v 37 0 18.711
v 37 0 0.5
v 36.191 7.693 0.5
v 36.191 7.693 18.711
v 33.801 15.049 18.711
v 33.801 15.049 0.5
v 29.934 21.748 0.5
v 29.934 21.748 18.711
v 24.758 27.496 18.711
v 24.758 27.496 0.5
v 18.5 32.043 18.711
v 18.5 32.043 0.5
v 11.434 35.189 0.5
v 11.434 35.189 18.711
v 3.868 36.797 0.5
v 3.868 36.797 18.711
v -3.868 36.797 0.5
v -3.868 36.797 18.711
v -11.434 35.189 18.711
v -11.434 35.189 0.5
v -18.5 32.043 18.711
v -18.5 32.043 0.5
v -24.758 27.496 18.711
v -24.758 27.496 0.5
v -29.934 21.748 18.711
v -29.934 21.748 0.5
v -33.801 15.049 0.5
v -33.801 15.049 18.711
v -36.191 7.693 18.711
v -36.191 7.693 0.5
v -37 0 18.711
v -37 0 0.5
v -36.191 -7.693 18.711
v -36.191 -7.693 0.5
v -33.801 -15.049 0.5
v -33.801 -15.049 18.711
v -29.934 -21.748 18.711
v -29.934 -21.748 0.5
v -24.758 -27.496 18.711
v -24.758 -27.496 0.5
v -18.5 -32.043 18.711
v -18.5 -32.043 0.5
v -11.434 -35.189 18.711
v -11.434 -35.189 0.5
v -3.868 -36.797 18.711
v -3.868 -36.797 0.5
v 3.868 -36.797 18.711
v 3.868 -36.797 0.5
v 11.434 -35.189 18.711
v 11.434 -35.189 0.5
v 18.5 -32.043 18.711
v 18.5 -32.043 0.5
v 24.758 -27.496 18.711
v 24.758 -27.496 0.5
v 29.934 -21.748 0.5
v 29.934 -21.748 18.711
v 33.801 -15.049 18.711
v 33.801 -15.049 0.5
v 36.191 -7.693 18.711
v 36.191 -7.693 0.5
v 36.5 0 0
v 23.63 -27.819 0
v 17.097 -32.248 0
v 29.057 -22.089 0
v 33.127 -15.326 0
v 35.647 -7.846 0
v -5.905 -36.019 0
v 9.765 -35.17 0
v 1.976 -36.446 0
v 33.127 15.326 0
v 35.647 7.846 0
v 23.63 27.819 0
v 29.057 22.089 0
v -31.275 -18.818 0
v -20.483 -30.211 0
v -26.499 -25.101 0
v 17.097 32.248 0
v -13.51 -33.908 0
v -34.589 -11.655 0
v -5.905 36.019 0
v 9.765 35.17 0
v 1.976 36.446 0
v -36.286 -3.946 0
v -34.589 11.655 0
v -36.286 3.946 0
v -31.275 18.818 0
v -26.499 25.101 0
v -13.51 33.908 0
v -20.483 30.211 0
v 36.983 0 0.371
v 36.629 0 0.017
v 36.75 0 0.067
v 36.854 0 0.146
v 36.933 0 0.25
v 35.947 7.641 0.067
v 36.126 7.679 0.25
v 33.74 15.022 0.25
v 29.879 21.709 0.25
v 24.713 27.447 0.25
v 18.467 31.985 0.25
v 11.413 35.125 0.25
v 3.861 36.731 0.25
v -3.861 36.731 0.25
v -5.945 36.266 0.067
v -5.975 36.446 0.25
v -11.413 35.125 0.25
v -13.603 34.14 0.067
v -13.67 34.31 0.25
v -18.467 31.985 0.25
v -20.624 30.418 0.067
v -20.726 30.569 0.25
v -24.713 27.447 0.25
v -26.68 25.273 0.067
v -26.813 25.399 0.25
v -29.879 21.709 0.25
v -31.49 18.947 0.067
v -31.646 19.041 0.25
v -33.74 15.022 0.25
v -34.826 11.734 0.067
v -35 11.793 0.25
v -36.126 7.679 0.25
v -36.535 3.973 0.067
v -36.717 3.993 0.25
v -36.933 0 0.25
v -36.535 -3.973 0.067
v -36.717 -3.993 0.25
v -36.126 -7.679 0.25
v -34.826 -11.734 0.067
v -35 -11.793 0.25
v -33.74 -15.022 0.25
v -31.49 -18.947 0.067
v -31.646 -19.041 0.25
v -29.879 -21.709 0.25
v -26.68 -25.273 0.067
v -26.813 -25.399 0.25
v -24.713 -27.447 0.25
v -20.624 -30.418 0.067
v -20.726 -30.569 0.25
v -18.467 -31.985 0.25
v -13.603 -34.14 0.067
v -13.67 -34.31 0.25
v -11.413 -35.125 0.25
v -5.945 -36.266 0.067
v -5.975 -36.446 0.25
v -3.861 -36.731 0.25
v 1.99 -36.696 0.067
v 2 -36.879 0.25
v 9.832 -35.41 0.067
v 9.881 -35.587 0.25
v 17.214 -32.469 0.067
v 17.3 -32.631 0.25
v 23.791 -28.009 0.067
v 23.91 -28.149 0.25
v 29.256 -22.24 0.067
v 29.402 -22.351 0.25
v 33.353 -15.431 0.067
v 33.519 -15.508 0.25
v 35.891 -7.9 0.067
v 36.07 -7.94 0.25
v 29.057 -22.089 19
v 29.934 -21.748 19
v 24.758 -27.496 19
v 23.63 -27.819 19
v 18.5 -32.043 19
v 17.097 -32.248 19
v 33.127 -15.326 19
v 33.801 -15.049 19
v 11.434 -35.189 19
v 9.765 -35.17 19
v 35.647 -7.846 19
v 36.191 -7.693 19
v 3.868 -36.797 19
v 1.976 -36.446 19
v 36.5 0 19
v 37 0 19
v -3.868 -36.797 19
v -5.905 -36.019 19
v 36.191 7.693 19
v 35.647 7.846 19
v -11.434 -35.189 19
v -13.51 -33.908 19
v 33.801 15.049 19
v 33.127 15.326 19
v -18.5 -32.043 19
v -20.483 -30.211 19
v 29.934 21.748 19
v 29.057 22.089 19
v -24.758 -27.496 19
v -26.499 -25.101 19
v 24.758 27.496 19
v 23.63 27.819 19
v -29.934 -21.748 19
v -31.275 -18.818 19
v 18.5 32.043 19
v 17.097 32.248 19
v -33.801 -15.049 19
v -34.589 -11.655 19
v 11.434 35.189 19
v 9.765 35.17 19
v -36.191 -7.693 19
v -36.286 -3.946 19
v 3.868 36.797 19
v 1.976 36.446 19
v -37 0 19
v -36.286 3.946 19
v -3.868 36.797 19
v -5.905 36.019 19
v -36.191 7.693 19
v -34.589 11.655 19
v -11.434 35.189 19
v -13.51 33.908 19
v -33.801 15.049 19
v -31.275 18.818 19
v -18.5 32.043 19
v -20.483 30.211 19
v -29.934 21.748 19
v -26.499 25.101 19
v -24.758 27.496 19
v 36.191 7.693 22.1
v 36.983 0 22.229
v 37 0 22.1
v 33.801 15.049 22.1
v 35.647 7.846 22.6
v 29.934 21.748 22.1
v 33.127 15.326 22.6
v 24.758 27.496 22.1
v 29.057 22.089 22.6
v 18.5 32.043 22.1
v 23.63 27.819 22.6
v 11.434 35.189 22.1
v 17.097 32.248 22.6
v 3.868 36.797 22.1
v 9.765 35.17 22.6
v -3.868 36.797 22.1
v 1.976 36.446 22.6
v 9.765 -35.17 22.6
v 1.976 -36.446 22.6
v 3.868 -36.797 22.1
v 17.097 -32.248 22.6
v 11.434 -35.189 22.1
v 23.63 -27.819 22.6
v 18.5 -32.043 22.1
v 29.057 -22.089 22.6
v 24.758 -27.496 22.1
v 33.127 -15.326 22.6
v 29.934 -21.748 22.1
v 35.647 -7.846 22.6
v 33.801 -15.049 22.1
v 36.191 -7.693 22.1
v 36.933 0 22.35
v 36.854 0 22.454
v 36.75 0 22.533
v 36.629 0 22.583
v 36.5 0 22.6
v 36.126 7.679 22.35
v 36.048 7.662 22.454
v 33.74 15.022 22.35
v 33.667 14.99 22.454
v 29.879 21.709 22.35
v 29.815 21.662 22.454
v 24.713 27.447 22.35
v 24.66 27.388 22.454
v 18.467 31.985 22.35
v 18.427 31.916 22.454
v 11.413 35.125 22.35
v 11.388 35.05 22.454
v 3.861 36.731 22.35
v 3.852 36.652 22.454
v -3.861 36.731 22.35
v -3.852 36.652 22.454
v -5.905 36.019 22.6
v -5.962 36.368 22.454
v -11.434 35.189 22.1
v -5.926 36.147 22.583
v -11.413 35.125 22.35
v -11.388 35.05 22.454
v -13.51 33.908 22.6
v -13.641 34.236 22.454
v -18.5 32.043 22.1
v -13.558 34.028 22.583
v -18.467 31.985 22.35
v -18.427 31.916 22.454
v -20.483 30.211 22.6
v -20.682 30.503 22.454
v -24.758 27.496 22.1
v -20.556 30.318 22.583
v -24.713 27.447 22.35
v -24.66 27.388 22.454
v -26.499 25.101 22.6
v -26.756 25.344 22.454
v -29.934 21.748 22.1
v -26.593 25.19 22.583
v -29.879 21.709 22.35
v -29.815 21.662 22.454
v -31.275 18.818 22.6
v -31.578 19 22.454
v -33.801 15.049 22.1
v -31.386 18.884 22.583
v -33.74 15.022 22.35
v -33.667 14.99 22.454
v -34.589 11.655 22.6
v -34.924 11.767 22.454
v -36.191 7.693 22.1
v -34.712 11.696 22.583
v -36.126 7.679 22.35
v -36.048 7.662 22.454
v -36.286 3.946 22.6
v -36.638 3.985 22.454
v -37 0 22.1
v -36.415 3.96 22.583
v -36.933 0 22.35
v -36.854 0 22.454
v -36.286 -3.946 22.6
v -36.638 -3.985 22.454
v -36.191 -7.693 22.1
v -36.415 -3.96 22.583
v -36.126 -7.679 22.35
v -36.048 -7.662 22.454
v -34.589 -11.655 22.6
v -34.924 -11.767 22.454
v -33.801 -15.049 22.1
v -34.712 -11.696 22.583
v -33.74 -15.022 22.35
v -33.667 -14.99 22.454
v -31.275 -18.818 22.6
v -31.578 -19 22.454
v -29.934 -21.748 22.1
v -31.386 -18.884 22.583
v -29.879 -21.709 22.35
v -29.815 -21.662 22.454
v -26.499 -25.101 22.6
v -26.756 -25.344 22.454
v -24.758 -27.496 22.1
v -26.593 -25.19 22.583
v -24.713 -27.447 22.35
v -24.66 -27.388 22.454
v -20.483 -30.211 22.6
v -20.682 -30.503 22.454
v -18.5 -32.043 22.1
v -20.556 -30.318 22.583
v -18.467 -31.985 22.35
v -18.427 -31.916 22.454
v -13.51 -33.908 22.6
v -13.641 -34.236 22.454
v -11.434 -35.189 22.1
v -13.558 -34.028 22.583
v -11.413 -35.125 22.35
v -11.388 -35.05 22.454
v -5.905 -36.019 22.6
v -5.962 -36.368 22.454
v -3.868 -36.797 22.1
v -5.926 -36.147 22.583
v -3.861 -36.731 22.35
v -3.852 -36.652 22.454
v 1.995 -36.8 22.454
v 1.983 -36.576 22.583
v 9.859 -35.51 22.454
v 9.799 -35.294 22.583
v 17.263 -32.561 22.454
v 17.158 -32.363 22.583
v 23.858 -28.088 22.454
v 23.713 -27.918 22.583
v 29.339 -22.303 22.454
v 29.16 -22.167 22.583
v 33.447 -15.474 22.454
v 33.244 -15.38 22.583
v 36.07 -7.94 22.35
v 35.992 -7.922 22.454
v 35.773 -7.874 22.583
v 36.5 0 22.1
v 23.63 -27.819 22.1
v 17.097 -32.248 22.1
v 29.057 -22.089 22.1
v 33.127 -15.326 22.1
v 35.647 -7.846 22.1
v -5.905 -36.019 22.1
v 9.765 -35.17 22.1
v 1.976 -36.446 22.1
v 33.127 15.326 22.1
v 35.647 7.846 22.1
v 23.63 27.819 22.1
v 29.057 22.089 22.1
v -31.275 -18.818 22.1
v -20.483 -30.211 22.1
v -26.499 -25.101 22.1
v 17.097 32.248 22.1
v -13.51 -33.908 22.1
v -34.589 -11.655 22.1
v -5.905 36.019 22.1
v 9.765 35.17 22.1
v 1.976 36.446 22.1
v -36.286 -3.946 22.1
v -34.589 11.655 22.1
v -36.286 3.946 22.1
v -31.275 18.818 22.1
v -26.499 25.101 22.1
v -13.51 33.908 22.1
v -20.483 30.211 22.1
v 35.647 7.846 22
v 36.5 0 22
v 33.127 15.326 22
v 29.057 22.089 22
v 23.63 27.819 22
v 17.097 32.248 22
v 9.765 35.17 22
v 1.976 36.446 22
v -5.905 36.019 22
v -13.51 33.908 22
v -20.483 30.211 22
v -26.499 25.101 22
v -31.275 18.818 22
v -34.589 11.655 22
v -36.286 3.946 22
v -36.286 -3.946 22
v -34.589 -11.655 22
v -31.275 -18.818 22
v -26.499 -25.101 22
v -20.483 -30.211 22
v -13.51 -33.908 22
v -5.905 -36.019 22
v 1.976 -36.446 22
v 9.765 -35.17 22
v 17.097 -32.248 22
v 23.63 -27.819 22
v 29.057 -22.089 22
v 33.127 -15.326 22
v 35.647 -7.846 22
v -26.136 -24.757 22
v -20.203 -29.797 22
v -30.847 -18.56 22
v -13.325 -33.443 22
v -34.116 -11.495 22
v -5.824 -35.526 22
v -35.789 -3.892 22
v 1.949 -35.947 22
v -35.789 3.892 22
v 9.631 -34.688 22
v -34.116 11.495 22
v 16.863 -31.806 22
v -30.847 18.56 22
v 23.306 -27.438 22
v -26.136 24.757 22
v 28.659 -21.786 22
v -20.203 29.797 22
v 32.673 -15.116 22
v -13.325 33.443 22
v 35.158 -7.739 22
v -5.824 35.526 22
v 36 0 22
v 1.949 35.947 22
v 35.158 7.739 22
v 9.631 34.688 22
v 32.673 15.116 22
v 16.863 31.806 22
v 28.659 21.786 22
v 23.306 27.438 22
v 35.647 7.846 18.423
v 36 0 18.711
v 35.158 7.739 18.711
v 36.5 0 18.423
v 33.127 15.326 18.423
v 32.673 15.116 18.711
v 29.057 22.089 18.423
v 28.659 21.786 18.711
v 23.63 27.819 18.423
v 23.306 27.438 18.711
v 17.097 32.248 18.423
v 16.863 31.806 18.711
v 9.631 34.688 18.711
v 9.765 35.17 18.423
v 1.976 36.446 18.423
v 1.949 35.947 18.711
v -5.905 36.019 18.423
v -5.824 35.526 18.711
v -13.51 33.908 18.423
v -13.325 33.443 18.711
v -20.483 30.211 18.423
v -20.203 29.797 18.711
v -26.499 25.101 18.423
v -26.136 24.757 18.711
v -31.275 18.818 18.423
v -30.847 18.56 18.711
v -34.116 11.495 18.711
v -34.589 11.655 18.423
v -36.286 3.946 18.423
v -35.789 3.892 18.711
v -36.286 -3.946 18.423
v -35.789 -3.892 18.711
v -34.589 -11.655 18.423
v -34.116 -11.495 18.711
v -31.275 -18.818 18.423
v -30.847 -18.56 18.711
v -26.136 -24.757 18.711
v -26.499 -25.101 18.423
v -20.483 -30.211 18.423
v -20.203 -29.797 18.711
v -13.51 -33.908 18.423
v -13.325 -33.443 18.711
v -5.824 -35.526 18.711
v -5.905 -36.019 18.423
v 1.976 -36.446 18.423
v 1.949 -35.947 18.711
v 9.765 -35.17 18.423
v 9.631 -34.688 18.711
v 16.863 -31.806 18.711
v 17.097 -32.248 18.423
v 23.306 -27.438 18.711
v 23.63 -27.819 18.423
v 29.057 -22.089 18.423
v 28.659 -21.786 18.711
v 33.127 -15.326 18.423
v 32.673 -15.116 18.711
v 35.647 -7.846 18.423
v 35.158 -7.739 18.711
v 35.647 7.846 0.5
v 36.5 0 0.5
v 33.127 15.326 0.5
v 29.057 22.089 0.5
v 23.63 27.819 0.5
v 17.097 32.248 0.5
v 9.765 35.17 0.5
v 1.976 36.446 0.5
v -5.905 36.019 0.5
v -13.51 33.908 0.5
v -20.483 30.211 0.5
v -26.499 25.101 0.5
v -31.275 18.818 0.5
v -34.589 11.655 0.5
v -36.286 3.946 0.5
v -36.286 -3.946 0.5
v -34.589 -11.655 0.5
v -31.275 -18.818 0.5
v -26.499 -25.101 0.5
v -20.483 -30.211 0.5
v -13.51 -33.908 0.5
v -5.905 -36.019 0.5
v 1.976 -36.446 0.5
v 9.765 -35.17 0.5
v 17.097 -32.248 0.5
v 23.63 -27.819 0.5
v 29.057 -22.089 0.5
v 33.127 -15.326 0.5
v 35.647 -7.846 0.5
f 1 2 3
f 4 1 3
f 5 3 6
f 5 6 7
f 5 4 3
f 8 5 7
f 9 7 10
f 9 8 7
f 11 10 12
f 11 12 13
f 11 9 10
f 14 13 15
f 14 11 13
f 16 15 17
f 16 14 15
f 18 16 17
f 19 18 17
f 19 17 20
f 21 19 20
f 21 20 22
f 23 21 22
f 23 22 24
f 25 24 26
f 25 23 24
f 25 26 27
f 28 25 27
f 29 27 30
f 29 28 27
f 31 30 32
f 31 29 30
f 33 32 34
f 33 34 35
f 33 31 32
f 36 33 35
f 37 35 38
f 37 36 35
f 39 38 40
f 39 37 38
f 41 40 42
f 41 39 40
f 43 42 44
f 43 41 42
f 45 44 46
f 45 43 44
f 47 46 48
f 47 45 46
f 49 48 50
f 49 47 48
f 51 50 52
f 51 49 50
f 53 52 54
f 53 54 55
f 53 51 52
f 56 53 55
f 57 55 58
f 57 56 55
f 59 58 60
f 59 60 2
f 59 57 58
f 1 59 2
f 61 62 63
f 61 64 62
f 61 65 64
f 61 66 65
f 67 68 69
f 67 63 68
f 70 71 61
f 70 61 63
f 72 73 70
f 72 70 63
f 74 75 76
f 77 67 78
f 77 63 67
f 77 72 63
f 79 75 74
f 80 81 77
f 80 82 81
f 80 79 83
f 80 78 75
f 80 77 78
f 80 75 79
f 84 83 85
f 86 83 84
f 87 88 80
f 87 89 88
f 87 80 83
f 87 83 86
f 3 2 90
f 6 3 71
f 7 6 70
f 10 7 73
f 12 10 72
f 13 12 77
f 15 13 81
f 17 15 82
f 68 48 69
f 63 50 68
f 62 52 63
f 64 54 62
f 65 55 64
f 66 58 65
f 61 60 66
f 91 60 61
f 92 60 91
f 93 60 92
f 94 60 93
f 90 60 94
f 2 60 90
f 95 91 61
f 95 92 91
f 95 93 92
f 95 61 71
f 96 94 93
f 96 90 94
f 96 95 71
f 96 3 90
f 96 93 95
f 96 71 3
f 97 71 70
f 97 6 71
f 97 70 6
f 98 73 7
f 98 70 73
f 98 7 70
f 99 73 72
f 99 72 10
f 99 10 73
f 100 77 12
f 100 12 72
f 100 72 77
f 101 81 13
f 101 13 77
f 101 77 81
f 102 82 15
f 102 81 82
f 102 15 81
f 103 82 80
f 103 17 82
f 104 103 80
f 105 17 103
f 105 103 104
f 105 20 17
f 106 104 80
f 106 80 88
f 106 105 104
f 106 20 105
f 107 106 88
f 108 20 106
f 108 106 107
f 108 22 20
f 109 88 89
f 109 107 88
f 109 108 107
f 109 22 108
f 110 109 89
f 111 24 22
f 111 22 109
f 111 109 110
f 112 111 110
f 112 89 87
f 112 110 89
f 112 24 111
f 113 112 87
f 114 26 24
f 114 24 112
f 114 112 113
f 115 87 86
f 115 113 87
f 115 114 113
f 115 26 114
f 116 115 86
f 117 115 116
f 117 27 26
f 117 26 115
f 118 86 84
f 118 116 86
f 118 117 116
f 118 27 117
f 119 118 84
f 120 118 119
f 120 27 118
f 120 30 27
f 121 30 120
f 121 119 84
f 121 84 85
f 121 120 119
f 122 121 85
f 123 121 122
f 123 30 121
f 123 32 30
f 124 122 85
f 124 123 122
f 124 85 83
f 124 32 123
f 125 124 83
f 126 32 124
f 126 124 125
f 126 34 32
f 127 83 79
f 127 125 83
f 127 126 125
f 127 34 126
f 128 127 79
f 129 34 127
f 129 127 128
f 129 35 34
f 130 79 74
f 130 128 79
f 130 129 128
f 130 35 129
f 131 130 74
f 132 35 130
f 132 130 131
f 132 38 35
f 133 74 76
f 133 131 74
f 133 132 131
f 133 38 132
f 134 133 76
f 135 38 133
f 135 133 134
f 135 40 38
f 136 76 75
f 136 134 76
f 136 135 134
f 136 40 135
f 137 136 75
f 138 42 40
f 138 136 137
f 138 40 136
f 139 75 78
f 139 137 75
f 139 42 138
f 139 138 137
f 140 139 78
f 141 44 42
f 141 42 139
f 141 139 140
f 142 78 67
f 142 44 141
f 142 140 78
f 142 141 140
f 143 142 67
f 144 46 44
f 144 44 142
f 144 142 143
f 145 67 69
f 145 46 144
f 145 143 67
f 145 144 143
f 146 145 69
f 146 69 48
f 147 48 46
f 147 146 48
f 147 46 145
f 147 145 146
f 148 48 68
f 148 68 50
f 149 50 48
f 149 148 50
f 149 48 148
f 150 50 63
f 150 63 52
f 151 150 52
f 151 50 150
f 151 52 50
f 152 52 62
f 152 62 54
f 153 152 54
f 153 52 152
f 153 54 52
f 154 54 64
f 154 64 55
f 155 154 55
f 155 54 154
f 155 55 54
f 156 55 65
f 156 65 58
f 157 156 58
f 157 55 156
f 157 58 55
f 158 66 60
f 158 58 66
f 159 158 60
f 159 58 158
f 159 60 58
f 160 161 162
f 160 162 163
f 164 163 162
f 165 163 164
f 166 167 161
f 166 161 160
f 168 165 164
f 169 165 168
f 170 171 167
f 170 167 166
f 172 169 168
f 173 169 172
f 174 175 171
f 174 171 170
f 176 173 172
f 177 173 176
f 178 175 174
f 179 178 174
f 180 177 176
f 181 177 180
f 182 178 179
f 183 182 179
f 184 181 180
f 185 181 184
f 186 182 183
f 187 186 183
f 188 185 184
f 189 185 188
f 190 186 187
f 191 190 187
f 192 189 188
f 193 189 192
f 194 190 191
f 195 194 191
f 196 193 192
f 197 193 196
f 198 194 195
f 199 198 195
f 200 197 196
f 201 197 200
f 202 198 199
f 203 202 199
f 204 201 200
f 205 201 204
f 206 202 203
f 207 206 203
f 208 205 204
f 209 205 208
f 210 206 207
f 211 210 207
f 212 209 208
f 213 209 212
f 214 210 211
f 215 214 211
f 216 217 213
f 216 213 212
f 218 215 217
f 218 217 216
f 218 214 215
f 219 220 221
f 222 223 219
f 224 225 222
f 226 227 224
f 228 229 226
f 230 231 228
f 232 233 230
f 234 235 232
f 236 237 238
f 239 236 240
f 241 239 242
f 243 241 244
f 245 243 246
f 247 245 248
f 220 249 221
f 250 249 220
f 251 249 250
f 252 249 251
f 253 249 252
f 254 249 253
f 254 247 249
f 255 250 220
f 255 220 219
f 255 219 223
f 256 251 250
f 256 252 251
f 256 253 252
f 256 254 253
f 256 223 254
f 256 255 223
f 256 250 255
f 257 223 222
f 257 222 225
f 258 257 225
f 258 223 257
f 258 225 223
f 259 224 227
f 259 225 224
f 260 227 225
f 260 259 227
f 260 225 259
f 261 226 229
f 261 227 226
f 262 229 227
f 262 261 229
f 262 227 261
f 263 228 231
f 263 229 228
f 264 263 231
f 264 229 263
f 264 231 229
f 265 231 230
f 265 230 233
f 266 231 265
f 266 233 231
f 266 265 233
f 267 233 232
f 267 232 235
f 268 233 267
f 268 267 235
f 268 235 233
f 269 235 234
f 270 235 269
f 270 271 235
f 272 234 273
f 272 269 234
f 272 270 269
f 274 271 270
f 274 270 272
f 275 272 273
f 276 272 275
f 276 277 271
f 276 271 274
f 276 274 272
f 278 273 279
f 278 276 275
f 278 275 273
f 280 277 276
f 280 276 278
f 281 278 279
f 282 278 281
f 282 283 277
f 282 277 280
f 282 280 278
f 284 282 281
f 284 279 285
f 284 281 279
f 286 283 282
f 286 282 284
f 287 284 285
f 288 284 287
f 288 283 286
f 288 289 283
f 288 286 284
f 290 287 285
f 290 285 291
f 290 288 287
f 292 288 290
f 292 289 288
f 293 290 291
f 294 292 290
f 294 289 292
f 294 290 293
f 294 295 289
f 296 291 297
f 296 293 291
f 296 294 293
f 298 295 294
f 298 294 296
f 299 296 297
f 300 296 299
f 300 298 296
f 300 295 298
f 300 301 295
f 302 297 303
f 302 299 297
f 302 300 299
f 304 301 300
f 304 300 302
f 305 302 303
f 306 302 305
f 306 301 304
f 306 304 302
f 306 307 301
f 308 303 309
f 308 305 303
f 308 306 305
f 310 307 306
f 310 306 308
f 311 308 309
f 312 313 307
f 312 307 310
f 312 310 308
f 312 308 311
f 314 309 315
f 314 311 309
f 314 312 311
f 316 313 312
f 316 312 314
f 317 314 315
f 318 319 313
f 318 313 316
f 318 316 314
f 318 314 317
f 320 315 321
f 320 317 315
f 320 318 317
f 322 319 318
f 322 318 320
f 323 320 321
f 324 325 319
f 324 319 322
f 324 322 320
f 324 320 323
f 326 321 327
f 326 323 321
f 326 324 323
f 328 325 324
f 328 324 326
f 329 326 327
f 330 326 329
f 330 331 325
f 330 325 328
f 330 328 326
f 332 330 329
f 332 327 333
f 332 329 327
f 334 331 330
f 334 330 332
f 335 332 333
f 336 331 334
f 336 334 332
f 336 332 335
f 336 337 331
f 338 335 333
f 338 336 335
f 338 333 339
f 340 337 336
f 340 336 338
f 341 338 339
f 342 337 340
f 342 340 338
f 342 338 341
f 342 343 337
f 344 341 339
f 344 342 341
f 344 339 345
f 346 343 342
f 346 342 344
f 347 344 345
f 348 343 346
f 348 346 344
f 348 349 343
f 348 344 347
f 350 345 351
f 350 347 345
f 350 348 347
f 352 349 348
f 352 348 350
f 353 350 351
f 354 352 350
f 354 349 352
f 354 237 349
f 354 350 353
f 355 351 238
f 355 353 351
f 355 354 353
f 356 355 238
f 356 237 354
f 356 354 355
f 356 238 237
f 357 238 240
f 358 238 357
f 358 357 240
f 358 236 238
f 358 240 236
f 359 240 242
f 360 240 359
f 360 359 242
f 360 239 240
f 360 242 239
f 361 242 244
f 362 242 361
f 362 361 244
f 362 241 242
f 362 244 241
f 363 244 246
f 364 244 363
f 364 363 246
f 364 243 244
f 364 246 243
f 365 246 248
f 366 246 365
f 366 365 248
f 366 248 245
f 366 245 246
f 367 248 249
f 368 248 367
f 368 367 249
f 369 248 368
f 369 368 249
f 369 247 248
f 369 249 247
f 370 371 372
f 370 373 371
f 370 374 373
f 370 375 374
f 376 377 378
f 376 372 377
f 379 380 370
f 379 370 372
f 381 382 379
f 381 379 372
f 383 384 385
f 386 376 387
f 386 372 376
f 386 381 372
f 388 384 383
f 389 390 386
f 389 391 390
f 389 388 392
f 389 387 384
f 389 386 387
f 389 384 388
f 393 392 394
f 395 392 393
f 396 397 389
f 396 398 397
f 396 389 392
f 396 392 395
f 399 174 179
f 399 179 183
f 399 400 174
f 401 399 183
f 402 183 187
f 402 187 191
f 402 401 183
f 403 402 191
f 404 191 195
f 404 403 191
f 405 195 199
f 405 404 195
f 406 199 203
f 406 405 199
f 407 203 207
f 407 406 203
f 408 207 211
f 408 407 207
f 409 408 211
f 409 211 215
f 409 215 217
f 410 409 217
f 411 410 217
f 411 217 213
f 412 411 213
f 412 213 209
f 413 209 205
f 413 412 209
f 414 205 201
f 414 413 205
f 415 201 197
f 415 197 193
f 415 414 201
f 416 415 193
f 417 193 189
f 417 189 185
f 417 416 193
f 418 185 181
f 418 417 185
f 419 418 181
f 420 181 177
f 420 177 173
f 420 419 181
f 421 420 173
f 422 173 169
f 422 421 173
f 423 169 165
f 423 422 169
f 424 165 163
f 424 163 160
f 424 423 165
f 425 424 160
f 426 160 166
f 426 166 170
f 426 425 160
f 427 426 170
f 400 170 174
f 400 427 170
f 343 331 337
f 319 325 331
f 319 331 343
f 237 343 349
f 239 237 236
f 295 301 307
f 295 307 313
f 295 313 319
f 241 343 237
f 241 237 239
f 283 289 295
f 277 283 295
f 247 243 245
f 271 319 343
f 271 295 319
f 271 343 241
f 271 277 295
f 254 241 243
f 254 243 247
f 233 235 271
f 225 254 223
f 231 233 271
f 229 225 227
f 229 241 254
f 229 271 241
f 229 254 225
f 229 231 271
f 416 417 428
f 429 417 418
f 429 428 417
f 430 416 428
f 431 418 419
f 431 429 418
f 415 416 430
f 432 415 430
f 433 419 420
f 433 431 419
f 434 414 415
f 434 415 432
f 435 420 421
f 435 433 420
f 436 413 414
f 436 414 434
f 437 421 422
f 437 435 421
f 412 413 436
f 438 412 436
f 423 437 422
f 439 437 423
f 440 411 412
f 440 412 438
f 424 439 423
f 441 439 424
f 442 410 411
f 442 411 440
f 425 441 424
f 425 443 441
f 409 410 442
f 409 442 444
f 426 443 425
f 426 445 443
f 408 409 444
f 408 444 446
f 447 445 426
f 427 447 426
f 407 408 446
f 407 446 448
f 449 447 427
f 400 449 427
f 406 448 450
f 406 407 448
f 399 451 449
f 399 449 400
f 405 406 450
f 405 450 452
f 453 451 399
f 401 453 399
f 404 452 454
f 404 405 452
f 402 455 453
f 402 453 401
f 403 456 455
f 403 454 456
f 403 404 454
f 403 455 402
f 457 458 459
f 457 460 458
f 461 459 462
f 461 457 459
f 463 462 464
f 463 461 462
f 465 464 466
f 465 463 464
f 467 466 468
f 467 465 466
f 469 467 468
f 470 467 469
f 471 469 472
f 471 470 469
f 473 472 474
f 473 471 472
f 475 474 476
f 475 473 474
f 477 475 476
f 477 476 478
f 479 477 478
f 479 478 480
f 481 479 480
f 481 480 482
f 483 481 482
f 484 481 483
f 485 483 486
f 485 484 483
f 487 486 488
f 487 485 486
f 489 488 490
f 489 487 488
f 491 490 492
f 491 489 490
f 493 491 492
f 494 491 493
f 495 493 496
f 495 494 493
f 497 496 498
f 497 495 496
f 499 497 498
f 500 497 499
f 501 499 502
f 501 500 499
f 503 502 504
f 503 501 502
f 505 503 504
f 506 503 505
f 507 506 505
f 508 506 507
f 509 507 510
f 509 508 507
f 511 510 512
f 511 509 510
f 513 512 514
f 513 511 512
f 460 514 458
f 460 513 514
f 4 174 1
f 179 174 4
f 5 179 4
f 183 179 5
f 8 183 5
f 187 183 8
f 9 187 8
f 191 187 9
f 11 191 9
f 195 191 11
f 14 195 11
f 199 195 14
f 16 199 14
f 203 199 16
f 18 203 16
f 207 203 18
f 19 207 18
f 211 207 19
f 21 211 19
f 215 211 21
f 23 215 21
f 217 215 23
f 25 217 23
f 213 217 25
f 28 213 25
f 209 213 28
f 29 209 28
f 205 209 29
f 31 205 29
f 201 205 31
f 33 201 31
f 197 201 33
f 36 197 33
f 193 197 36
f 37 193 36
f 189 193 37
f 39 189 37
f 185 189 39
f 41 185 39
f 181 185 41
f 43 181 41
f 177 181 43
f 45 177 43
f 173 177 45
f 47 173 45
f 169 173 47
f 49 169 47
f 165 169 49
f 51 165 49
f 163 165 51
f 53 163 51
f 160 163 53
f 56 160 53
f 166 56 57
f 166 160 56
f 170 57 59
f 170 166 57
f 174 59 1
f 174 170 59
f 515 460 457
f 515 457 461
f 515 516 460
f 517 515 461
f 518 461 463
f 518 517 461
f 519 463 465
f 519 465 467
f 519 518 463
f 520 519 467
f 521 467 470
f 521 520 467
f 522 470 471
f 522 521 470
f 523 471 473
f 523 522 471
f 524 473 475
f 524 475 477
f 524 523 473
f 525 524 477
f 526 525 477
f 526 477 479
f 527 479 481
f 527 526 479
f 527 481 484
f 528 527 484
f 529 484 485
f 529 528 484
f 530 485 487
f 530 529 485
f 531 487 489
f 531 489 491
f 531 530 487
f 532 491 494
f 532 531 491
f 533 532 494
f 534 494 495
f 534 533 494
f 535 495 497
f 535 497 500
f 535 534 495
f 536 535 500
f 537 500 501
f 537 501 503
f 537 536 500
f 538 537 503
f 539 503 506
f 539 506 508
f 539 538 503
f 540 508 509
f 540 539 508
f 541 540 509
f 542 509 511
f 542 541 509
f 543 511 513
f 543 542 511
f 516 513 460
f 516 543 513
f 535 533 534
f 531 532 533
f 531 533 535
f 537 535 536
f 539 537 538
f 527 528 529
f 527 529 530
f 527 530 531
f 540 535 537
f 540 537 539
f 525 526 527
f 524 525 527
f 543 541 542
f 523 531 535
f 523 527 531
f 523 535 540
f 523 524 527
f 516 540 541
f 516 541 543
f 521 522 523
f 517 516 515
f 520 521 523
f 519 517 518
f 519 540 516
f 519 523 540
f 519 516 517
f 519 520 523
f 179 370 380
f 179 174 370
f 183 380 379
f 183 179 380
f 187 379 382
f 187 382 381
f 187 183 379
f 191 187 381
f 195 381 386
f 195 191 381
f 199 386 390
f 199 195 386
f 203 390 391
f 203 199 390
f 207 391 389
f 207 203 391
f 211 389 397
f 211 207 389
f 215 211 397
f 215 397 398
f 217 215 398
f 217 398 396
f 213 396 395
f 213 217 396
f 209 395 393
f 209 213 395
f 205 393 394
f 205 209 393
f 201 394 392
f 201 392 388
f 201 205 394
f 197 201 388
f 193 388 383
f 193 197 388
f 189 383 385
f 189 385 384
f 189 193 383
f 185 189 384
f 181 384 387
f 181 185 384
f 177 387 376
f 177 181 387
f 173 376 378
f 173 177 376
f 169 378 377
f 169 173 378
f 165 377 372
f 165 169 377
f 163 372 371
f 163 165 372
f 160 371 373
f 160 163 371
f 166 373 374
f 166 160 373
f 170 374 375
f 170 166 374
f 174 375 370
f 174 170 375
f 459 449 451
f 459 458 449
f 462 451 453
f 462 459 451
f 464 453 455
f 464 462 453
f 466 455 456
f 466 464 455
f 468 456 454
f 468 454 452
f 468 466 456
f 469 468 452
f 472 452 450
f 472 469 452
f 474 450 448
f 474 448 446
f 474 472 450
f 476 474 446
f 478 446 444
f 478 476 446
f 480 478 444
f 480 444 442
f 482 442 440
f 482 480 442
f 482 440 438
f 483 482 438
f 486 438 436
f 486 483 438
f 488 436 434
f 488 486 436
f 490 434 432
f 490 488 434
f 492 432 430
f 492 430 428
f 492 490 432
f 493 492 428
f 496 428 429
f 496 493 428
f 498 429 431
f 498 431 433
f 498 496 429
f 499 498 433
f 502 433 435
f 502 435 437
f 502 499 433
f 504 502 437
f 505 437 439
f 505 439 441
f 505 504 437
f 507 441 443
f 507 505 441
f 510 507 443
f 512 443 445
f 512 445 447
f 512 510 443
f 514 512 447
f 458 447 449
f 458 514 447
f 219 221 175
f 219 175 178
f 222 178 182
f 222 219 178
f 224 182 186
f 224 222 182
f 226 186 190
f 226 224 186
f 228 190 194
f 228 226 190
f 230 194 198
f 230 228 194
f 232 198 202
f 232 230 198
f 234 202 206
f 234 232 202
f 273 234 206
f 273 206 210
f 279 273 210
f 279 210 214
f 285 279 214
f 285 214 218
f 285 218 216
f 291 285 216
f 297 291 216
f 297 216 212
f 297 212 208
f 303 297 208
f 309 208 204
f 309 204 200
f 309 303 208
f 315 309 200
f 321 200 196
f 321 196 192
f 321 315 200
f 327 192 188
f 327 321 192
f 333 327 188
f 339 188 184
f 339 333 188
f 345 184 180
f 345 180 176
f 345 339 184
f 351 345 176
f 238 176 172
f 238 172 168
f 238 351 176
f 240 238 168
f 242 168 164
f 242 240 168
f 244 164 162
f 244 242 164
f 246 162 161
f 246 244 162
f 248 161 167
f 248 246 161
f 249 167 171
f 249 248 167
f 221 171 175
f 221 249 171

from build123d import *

# Parameters (mm, degrees)
F2_R = 0.5
F5_R = 0.5


with BuildPart() as f1:
    # F0 (on Front) → F1 (revolve)
    with BuildSketch(Plane.XZ):
        Polygon((0, 0.5), (0, 0), (37, 0), (37, 18.711325), (36.5, 19), (36.5, 22), (36, 22), (36, 18.711325), (36.5, 18.42265), (36.5, 0.5), align=None)
    revolve(axis=Axis((0, 0, 11), (0, 0, 1)))

    # F2
    f2_edges = [f1.edges().sort_by_distance(p)[0] for p in [
        (-37, 0, 0),
    ]]
    fillet(f2_edges, radius=F2_R)


with BuildPart() as f4:
    # F3 (on Front) → F4 (revolve)
    with BuildSketch(Plane.XZ):
        Polygon((0, 22.1), (36.5, 22.1), (36.5, 19), (37, 19), (37, 22.6), (0, 22.6), align=None)
    revolve(axis=Axis((0, 0, 11.3), (0, 0, 1)))

    # F5
    f5_edges = [f4.edges().sort_by_distance(p)[0] for p in [
        (-37, 0, 22.6),
    ]]
    fillet(f5_edges, radius=F5_R)


solid = Compound([f1.part, f4.part])
